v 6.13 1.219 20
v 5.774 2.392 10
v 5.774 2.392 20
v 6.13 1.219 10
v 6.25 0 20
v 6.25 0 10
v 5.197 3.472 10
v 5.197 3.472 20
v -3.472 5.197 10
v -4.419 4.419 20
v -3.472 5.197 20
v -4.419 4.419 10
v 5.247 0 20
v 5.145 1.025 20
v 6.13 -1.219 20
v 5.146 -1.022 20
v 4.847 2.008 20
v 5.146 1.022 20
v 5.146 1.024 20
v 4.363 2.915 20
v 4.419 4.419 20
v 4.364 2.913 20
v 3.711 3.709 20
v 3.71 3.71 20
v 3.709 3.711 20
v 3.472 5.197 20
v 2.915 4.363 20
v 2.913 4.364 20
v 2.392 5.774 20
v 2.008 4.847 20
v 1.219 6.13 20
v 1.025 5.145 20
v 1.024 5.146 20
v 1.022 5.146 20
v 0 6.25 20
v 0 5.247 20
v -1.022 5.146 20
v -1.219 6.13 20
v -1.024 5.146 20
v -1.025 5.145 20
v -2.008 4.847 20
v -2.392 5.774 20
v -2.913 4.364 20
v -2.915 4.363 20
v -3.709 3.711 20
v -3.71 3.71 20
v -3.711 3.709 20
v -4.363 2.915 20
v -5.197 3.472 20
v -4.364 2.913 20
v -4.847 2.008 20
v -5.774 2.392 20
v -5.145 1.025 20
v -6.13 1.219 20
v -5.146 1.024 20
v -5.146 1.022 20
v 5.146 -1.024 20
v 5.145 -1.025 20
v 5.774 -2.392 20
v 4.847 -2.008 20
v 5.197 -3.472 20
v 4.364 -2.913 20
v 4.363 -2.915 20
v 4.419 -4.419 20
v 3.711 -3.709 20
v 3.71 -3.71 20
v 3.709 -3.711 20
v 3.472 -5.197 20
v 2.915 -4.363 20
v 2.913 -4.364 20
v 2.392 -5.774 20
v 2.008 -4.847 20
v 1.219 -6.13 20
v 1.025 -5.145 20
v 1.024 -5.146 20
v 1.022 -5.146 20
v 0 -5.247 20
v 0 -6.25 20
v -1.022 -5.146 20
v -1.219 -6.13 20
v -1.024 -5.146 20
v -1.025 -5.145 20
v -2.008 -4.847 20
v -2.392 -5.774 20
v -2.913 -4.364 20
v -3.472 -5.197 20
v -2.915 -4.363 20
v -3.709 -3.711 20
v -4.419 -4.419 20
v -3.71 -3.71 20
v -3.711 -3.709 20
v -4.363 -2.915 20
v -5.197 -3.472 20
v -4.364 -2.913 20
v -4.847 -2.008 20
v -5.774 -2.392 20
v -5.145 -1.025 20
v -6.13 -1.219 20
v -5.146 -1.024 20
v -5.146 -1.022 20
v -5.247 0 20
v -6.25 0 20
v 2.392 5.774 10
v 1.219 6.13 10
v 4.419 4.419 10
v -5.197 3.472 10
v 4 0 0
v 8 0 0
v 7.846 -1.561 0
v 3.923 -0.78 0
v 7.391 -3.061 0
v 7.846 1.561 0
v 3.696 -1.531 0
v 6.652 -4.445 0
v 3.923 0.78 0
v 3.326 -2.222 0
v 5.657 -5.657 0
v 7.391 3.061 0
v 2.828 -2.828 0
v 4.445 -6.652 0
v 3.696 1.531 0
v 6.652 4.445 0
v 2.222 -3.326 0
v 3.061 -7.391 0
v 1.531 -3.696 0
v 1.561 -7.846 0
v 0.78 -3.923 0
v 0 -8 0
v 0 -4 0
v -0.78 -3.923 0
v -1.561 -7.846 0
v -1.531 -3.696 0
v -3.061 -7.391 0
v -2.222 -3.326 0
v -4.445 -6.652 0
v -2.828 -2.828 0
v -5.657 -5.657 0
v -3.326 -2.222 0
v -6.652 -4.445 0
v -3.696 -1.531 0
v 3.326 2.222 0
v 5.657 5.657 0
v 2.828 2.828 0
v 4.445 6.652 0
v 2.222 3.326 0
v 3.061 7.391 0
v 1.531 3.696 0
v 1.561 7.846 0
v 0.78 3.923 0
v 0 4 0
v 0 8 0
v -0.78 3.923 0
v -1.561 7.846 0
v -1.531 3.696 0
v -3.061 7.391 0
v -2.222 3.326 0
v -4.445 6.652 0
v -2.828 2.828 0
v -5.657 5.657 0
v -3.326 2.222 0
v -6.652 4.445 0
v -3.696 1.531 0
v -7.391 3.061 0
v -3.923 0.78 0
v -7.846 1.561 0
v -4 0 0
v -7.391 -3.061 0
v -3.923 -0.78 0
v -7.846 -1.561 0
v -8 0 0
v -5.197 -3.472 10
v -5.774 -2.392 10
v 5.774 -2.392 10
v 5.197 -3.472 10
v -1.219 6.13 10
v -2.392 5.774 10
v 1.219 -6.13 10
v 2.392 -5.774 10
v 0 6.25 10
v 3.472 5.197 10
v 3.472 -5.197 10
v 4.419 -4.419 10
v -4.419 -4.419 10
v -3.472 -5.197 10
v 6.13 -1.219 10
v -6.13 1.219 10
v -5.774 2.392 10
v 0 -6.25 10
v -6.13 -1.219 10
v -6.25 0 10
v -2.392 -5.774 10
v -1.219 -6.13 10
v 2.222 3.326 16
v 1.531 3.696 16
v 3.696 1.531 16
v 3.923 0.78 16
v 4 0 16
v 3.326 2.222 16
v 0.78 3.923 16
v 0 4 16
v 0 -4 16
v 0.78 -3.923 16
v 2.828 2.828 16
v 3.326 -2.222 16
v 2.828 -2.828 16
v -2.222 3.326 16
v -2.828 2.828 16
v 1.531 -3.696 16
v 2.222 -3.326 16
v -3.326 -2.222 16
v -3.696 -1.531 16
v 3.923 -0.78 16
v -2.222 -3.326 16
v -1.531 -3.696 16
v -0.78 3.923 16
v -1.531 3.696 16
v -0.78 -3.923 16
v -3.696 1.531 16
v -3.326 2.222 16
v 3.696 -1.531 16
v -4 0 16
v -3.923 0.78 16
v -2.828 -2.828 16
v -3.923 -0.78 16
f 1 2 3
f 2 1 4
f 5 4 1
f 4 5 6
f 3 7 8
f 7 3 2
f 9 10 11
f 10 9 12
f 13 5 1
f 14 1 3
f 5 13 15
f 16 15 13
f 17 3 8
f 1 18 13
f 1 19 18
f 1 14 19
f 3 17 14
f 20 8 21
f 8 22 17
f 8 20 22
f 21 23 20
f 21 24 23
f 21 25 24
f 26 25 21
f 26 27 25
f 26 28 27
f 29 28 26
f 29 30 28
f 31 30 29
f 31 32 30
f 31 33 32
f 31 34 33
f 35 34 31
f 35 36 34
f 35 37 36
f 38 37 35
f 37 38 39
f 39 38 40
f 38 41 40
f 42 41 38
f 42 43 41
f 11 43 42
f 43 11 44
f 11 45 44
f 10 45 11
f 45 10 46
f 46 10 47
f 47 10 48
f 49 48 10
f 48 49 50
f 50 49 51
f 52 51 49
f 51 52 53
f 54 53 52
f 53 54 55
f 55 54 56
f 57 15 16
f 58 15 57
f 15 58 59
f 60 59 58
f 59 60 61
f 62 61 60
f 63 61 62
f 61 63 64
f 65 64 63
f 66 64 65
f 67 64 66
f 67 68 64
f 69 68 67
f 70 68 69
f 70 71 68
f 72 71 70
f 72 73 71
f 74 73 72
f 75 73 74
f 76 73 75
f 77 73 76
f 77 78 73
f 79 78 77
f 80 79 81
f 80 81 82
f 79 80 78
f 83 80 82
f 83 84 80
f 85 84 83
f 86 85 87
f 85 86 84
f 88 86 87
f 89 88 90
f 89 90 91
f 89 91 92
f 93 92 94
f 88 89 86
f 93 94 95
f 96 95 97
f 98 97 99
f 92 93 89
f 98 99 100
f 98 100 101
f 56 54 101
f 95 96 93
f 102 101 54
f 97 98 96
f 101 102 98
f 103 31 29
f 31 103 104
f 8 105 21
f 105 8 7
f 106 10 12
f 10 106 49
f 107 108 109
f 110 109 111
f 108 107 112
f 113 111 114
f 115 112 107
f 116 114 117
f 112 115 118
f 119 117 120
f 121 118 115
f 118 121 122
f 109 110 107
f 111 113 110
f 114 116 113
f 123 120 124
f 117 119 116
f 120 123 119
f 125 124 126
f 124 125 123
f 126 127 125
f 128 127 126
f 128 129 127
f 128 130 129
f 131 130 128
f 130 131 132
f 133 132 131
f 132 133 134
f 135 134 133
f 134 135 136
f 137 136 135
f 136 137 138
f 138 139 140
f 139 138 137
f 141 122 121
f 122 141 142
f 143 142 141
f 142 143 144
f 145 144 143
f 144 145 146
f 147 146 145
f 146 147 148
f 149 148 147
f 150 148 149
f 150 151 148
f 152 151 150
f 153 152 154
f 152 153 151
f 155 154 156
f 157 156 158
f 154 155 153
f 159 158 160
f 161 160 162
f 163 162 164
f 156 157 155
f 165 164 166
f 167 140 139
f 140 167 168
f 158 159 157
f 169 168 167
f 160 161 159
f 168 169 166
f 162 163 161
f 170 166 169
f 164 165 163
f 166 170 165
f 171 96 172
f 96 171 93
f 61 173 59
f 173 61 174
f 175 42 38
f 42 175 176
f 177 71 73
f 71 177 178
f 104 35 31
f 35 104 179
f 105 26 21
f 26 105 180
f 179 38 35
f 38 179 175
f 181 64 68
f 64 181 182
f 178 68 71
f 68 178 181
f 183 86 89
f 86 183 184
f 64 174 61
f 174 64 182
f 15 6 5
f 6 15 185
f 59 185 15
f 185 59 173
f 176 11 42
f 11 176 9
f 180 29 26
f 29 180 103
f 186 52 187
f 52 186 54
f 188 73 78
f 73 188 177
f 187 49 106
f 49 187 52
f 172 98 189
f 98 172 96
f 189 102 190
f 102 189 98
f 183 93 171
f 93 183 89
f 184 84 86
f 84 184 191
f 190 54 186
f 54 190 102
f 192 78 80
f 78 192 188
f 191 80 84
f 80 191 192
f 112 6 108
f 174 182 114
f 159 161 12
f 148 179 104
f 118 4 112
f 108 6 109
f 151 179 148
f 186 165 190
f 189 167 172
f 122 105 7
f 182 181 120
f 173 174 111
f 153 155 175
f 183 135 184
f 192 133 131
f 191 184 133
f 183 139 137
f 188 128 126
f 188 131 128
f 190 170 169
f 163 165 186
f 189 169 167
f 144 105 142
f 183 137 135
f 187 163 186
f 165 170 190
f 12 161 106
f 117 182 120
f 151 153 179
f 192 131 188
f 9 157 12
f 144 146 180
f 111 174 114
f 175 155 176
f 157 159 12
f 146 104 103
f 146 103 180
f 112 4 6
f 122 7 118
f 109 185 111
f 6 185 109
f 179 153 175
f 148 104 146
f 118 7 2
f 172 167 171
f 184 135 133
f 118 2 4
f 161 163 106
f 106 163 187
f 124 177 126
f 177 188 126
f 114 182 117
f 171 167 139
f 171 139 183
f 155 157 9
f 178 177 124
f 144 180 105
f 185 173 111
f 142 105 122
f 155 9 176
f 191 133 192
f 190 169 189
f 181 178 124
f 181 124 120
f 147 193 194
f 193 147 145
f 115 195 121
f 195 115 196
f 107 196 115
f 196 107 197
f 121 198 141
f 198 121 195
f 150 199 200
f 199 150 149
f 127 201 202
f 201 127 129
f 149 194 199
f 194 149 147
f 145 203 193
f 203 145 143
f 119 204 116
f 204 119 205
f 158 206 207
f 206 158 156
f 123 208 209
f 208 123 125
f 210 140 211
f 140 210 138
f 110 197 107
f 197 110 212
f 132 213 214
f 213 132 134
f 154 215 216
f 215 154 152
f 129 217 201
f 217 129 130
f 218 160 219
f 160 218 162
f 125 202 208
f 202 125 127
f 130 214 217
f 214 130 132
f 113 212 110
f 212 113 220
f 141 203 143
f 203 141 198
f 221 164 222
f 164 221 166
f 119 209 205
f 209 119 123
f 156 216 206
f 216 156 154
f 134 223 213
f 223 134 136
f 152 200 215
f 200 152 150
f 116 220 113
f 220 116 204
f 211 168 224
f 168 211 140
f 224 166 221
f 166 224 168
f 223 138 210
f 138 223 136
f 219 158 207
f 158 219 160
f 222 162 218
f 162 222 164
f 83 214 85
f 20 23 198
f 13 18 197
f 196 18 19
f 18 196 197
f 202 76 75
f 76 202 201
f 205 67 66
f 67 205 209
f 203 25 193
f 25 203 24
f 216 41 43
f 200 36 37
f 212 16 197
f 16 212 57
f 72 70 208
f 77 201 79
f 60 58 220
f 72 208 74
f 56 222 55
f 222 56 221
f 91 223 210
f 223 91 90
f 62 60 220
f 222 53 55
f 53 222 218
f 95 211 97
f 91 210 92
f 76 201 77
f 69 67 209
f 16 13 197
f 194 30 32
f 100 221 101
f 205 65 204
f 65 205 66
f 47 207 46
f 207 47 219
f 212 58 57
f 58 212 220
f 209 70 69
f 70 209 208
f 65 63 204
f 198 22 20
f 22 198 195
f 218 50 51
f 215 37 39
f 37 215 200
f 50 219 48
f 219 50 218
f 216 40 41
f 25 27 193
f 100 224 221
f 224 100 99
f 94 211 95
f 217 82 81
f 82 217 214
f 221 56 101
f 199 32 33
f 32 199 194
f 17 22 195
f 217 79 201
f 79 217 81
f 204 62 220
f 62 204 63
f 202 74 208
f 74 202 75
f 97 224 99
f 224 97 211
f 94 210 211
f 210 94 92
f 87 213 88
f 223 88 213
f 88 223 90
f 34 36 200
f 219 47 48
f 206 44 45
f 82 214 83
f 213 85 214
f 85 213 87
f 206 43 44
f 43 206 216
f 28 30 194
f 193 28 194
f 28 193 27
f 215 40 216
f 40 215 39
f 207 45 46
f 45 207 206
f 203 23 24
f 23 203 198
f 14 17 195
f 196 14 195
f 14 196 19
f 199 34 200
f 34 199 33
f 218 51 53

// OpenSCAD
// This is a trivial tool to support a 16mm lens as it is inserted
// into the holder.  Part of the OpenFlexure Microscope.

// (c) 2017 Richard Bowman, released under CERN open hardware license.

use <./libs/utilities.scad>

function lens_tool_height() = 20;

module lens_tool(h=lens_tool_height()){
    $fn=32;

    difference(){
        union(){
            cylinder(d=12.5, h=h);
            cylinder(d1=16, d2=12.5, h=10);
        }
        // hollow it out
        cylinder(d=8, h=999, center=true);
        // bevel the top
        translate_z(h-4){
            cylinder(d1=8, d2=10.5, h=4.01);
        }
    }
}

lens_tool();
